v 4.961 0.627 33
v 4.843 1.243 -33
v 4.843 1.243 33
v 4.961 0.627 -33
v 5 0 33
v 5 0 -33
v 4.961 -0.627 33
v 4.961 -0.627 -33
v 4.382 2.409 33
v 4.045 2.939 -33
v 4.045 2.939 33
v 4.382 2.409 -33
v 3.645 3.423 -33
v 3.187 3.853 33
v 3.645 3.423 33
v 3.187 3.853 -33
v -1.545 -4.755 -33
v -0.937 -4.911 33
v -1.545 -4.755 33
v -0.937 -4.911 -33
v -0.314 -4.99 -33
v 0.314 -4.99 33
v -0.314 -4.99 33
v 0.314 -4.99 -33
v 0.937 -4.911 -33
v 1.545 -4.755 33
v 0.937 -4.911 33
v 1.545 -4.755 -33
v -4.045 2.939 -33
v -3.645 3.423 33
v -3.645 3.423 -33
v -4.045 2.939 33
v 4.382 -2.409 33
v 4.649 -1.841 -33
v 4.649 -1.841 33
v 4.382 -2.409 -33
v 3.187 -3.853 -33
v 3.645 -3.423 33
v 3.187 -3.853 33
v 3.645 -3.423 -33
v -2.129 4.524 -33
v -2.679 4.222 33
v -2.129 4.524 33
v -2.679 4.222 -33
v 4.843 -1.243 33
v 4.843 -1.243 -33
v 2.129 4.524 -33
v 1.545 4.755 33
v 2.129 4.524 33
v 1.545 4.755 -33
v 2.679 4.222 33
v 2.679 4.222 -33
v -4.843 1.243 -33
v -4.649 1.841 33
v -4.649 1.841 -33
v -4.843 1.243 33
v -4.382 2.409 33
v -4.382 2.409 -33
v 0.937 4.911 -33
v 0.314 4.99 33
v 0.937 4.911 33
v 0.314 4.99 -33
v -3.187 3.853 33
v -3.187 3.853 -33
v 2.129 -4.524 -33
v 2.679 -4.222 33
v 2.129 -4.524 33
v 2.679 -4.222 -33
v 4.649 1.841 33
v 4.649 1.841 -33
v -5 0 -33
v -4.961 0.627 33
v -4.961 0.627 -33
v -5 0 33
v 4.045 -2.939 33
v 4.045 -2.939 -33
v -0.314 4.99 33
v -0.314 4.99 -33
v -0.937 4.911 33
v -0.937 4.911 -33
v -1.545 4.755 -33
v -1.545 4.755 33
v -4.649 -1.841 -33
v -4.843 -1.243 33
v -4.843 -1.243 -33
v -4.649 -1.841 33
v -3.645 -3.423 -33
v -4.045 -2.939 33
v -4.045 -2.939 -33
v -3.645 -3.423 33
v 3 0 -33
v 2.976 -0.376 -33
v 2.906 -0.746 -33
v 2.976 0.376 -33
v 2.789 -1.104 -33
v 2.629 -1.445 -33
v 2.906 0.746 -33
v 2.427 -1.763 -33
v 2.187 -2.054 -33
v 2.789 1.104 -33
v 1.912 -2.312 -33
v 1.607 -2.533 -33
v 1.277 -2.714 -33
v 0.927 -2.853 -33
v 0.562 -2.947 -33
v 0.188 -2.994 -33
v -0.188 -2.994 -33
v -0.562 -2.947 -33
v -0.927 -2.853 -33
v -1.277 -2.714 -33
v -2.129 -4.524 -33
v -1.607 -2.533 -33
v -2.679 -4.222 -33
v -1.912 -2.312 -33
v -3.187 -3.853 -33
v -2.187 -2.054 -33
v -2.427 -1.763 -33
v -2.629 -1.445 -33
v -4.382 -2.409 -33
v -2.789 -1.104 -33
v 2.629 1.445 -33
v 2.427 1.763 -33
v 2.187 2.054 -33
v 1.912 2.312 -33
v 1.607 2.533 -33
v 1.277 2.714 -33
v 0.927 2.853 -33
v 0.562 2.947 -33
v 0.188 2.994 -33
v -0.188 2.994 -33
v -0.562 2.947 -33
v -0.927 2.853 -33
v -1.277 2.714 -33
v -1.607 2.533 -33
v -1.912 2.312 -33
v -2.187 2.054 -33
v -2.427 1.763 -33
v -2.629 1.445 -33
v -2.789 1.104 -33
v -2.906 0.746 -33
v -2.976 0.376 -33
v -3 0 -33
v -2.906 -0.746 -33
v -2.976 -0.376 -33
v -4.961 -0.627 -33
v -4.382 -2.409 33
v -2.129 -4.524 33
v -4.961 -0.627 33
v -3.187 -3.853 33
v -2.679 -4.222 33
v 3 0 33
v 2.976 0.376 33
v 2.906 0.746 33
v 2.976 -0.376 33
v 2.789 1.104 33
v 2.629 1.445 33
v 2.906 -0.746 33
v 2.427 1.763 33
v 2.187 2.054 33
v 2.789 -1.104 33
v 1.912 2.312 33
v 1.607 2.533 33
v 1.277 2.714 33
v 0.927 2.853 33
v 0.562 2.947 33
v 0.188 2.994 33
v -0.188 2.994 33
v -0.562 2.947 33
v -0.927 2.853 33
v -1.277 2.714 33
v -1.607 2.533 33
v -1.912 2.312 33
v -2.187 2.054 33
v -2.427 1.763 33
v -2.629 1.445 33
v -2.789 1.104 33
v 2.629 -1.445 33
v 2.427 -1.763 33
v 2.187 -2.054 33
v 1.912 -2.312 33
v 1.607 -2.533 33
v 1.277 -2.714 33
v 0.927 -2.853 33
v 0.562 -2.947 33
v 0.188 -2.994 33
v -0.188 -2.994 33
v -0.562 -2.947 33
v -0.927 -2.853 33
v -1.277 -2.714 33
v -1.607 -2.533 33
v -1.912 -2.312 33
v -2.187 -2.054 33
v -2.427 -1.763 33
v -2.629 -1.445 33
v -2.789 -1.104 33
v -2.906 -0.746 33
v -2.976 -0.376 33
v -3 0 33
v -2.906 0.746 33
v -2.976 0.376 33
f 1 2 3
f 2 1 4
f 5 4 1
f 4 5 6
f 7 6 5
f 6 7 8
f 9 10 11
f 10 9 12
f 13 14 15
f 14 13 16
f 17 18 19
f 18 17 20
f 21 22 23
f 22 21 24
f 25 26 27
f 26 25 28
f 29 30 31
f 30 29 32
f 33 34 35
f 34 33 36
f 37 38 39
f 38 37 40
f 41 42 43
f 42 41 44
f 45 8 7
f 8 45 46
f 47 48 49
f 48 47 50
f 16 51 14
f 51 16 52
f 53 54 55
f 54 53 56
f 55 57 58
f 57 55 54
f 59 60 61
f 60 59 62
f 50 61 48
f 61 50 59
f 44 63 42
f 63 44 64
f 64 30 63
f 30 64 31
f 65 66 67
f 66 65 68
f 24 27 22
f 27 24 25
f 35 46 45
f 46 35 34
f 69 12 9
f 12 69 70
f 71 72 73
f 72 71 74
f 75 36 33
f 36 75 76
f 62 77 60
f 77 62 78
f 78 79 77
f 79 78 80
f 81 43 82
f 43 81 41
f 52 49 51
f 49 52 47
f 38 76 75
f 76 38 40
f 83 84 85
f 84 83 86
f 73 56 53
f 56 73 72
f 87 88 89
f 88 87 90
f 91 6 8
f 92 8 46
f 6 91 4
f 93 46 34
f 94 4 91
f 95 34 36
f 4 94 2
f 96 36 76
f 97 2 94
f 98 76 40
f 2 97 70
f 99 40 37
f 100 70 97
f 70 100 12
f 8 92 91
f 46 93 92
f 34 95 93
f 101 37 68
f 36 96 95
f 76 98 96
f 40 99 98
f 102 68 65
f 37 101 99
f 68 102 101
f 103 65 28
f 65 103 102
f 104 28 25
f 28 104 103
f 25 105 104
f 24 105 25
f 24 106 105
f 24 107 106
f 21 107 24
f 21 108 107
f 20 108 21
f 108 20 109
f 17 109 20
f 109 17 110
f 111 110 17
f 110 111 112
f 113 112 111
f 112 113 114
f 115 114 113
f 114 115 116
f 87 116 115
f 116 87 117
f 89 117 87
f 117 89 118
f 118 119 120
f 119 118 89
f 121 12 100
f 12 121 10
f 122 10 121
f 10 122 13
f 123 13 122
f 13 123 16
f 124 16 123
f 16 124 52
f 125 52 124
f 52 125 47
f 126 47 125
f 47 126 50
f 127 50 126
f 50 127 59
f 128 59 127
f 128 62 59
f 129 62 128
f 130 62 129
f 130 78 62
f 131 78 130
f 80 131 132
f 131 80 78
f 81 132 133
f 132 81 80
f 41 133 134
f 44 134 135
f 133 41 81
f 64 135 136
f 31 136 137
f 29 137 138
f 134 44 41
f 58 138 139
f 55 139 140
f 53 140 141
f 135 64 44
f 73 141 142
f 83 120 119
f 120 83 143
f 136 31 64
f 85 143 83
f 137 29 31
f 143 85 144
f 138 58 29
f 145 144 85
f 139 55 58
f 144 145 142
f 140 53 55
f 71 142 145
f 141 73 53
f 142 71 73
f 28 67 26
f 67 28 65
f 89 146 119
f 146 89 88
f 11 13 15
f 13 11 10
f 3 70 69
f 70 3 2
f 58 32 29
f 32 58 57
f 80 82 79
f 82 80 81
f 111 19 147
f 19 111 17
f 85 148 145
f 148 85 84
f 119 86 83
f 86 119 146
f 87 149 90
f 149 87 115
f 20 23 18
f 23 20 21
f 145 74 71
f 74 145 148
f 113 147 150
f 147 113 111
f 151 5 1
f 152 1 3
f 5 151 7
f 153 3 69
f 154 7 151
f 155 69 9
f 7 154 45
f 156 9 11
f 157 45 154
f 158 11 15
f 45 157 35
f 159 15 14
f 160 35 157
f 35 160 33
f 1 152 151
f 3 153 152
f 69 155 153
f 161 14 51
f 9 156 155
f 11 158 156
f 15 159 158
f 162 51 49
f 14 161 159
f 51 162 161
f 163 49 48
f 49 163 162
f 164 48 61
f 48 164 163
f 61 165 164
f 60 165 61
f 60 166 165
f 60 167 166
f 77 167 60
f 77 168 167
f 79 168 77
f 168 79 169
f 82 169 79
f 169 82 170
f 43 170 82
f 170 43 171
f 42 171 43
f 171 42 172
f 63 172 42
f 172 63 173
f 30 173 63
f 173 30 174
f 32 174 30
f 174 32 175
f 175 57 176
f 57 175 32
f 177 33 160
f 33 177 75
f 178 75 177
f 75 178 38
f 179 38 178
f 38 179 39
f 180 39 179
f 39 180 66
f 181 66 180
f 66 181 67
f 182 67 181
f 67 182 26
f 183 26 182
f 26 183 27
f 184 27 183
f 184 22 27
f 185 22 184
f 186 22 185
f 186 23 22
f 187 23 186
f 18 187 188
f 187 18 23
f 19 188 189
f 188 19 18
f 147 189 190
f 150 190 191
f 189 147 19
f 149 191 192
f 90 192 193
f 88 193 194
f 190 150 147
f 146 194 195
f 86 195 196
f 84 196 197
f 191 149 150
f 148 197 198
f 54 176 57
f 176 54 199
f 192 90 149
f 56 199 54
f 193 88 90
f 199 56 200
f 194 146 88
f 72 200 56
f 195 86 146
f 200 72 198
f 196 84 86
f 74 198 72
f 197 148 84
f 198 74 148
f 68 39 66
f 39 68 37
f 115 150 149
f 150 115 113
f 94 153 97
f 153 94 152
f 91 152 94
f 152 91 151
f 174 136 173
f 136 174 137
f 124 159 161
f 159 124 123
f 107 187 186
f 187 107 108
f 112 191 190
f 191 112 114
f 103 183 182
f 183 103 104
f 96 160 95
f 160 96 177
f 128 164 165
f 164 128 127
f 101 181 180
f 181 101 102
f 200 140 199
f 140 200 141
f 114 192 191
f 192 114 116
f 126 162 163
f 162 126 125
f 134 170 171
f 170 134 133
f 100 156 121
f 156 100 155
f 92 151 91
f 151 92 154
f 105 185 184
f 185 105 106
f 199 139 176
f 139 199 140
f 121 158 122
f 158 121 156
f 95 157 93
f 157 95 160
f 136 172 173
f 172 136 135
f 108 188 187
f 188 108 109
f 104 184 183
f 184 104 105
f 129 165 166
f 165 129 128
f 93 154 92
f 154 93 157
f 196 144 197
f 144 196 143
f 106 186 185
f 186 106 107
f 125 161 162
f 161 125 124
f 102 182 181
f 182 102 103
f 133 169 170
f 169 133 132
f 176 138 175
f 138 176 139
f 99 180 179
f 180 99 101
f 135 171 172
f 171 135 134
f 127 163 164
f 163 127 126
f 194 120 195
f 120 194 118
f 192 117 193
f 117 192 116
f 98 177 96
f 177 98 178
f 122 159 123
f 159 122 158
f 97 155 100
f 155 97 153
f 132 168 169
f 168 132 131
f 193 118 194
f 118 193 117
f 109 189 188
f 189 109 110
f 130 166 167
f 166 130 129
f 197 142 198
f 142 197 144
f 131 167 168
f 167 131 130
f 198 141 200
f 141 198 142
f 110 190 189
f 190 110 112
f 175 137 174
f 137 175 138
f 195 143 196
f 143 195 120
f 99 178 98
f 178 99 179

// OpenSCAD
$fn = 50;


difference() {
	union() {
		translate(v = [0, 0, -33.0000000000]) {
			cylinder(h = 66, r = 5.0000000000);
		}
	}
	union() {
		translate(v = [0, 0, -100.0000000000]) {
			cylinder(h = 200, r = 3.0000000000);
		}
	}
}
